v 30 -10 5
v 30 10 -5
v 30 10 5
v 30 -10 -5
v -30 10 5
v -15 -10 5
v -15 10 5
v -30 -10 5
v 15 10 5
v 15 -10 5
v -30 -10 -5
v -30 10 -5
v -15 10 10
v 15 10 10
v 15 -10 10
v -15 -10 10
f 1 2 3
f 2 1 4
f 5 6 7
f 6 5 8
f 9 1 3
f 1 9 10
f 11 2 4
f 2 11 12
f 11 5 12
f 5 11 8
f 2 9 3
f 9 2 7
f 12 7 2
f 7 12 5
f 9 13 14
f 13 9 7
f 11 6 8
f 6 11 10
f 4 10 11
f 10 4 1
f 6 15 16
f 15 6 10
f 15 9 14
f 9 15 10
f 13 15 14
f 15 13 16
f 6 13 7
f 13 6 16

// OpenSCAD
cube([60,20,10],center=true);
translate([0,0,5])
    cube([30,20,10],center=true);
